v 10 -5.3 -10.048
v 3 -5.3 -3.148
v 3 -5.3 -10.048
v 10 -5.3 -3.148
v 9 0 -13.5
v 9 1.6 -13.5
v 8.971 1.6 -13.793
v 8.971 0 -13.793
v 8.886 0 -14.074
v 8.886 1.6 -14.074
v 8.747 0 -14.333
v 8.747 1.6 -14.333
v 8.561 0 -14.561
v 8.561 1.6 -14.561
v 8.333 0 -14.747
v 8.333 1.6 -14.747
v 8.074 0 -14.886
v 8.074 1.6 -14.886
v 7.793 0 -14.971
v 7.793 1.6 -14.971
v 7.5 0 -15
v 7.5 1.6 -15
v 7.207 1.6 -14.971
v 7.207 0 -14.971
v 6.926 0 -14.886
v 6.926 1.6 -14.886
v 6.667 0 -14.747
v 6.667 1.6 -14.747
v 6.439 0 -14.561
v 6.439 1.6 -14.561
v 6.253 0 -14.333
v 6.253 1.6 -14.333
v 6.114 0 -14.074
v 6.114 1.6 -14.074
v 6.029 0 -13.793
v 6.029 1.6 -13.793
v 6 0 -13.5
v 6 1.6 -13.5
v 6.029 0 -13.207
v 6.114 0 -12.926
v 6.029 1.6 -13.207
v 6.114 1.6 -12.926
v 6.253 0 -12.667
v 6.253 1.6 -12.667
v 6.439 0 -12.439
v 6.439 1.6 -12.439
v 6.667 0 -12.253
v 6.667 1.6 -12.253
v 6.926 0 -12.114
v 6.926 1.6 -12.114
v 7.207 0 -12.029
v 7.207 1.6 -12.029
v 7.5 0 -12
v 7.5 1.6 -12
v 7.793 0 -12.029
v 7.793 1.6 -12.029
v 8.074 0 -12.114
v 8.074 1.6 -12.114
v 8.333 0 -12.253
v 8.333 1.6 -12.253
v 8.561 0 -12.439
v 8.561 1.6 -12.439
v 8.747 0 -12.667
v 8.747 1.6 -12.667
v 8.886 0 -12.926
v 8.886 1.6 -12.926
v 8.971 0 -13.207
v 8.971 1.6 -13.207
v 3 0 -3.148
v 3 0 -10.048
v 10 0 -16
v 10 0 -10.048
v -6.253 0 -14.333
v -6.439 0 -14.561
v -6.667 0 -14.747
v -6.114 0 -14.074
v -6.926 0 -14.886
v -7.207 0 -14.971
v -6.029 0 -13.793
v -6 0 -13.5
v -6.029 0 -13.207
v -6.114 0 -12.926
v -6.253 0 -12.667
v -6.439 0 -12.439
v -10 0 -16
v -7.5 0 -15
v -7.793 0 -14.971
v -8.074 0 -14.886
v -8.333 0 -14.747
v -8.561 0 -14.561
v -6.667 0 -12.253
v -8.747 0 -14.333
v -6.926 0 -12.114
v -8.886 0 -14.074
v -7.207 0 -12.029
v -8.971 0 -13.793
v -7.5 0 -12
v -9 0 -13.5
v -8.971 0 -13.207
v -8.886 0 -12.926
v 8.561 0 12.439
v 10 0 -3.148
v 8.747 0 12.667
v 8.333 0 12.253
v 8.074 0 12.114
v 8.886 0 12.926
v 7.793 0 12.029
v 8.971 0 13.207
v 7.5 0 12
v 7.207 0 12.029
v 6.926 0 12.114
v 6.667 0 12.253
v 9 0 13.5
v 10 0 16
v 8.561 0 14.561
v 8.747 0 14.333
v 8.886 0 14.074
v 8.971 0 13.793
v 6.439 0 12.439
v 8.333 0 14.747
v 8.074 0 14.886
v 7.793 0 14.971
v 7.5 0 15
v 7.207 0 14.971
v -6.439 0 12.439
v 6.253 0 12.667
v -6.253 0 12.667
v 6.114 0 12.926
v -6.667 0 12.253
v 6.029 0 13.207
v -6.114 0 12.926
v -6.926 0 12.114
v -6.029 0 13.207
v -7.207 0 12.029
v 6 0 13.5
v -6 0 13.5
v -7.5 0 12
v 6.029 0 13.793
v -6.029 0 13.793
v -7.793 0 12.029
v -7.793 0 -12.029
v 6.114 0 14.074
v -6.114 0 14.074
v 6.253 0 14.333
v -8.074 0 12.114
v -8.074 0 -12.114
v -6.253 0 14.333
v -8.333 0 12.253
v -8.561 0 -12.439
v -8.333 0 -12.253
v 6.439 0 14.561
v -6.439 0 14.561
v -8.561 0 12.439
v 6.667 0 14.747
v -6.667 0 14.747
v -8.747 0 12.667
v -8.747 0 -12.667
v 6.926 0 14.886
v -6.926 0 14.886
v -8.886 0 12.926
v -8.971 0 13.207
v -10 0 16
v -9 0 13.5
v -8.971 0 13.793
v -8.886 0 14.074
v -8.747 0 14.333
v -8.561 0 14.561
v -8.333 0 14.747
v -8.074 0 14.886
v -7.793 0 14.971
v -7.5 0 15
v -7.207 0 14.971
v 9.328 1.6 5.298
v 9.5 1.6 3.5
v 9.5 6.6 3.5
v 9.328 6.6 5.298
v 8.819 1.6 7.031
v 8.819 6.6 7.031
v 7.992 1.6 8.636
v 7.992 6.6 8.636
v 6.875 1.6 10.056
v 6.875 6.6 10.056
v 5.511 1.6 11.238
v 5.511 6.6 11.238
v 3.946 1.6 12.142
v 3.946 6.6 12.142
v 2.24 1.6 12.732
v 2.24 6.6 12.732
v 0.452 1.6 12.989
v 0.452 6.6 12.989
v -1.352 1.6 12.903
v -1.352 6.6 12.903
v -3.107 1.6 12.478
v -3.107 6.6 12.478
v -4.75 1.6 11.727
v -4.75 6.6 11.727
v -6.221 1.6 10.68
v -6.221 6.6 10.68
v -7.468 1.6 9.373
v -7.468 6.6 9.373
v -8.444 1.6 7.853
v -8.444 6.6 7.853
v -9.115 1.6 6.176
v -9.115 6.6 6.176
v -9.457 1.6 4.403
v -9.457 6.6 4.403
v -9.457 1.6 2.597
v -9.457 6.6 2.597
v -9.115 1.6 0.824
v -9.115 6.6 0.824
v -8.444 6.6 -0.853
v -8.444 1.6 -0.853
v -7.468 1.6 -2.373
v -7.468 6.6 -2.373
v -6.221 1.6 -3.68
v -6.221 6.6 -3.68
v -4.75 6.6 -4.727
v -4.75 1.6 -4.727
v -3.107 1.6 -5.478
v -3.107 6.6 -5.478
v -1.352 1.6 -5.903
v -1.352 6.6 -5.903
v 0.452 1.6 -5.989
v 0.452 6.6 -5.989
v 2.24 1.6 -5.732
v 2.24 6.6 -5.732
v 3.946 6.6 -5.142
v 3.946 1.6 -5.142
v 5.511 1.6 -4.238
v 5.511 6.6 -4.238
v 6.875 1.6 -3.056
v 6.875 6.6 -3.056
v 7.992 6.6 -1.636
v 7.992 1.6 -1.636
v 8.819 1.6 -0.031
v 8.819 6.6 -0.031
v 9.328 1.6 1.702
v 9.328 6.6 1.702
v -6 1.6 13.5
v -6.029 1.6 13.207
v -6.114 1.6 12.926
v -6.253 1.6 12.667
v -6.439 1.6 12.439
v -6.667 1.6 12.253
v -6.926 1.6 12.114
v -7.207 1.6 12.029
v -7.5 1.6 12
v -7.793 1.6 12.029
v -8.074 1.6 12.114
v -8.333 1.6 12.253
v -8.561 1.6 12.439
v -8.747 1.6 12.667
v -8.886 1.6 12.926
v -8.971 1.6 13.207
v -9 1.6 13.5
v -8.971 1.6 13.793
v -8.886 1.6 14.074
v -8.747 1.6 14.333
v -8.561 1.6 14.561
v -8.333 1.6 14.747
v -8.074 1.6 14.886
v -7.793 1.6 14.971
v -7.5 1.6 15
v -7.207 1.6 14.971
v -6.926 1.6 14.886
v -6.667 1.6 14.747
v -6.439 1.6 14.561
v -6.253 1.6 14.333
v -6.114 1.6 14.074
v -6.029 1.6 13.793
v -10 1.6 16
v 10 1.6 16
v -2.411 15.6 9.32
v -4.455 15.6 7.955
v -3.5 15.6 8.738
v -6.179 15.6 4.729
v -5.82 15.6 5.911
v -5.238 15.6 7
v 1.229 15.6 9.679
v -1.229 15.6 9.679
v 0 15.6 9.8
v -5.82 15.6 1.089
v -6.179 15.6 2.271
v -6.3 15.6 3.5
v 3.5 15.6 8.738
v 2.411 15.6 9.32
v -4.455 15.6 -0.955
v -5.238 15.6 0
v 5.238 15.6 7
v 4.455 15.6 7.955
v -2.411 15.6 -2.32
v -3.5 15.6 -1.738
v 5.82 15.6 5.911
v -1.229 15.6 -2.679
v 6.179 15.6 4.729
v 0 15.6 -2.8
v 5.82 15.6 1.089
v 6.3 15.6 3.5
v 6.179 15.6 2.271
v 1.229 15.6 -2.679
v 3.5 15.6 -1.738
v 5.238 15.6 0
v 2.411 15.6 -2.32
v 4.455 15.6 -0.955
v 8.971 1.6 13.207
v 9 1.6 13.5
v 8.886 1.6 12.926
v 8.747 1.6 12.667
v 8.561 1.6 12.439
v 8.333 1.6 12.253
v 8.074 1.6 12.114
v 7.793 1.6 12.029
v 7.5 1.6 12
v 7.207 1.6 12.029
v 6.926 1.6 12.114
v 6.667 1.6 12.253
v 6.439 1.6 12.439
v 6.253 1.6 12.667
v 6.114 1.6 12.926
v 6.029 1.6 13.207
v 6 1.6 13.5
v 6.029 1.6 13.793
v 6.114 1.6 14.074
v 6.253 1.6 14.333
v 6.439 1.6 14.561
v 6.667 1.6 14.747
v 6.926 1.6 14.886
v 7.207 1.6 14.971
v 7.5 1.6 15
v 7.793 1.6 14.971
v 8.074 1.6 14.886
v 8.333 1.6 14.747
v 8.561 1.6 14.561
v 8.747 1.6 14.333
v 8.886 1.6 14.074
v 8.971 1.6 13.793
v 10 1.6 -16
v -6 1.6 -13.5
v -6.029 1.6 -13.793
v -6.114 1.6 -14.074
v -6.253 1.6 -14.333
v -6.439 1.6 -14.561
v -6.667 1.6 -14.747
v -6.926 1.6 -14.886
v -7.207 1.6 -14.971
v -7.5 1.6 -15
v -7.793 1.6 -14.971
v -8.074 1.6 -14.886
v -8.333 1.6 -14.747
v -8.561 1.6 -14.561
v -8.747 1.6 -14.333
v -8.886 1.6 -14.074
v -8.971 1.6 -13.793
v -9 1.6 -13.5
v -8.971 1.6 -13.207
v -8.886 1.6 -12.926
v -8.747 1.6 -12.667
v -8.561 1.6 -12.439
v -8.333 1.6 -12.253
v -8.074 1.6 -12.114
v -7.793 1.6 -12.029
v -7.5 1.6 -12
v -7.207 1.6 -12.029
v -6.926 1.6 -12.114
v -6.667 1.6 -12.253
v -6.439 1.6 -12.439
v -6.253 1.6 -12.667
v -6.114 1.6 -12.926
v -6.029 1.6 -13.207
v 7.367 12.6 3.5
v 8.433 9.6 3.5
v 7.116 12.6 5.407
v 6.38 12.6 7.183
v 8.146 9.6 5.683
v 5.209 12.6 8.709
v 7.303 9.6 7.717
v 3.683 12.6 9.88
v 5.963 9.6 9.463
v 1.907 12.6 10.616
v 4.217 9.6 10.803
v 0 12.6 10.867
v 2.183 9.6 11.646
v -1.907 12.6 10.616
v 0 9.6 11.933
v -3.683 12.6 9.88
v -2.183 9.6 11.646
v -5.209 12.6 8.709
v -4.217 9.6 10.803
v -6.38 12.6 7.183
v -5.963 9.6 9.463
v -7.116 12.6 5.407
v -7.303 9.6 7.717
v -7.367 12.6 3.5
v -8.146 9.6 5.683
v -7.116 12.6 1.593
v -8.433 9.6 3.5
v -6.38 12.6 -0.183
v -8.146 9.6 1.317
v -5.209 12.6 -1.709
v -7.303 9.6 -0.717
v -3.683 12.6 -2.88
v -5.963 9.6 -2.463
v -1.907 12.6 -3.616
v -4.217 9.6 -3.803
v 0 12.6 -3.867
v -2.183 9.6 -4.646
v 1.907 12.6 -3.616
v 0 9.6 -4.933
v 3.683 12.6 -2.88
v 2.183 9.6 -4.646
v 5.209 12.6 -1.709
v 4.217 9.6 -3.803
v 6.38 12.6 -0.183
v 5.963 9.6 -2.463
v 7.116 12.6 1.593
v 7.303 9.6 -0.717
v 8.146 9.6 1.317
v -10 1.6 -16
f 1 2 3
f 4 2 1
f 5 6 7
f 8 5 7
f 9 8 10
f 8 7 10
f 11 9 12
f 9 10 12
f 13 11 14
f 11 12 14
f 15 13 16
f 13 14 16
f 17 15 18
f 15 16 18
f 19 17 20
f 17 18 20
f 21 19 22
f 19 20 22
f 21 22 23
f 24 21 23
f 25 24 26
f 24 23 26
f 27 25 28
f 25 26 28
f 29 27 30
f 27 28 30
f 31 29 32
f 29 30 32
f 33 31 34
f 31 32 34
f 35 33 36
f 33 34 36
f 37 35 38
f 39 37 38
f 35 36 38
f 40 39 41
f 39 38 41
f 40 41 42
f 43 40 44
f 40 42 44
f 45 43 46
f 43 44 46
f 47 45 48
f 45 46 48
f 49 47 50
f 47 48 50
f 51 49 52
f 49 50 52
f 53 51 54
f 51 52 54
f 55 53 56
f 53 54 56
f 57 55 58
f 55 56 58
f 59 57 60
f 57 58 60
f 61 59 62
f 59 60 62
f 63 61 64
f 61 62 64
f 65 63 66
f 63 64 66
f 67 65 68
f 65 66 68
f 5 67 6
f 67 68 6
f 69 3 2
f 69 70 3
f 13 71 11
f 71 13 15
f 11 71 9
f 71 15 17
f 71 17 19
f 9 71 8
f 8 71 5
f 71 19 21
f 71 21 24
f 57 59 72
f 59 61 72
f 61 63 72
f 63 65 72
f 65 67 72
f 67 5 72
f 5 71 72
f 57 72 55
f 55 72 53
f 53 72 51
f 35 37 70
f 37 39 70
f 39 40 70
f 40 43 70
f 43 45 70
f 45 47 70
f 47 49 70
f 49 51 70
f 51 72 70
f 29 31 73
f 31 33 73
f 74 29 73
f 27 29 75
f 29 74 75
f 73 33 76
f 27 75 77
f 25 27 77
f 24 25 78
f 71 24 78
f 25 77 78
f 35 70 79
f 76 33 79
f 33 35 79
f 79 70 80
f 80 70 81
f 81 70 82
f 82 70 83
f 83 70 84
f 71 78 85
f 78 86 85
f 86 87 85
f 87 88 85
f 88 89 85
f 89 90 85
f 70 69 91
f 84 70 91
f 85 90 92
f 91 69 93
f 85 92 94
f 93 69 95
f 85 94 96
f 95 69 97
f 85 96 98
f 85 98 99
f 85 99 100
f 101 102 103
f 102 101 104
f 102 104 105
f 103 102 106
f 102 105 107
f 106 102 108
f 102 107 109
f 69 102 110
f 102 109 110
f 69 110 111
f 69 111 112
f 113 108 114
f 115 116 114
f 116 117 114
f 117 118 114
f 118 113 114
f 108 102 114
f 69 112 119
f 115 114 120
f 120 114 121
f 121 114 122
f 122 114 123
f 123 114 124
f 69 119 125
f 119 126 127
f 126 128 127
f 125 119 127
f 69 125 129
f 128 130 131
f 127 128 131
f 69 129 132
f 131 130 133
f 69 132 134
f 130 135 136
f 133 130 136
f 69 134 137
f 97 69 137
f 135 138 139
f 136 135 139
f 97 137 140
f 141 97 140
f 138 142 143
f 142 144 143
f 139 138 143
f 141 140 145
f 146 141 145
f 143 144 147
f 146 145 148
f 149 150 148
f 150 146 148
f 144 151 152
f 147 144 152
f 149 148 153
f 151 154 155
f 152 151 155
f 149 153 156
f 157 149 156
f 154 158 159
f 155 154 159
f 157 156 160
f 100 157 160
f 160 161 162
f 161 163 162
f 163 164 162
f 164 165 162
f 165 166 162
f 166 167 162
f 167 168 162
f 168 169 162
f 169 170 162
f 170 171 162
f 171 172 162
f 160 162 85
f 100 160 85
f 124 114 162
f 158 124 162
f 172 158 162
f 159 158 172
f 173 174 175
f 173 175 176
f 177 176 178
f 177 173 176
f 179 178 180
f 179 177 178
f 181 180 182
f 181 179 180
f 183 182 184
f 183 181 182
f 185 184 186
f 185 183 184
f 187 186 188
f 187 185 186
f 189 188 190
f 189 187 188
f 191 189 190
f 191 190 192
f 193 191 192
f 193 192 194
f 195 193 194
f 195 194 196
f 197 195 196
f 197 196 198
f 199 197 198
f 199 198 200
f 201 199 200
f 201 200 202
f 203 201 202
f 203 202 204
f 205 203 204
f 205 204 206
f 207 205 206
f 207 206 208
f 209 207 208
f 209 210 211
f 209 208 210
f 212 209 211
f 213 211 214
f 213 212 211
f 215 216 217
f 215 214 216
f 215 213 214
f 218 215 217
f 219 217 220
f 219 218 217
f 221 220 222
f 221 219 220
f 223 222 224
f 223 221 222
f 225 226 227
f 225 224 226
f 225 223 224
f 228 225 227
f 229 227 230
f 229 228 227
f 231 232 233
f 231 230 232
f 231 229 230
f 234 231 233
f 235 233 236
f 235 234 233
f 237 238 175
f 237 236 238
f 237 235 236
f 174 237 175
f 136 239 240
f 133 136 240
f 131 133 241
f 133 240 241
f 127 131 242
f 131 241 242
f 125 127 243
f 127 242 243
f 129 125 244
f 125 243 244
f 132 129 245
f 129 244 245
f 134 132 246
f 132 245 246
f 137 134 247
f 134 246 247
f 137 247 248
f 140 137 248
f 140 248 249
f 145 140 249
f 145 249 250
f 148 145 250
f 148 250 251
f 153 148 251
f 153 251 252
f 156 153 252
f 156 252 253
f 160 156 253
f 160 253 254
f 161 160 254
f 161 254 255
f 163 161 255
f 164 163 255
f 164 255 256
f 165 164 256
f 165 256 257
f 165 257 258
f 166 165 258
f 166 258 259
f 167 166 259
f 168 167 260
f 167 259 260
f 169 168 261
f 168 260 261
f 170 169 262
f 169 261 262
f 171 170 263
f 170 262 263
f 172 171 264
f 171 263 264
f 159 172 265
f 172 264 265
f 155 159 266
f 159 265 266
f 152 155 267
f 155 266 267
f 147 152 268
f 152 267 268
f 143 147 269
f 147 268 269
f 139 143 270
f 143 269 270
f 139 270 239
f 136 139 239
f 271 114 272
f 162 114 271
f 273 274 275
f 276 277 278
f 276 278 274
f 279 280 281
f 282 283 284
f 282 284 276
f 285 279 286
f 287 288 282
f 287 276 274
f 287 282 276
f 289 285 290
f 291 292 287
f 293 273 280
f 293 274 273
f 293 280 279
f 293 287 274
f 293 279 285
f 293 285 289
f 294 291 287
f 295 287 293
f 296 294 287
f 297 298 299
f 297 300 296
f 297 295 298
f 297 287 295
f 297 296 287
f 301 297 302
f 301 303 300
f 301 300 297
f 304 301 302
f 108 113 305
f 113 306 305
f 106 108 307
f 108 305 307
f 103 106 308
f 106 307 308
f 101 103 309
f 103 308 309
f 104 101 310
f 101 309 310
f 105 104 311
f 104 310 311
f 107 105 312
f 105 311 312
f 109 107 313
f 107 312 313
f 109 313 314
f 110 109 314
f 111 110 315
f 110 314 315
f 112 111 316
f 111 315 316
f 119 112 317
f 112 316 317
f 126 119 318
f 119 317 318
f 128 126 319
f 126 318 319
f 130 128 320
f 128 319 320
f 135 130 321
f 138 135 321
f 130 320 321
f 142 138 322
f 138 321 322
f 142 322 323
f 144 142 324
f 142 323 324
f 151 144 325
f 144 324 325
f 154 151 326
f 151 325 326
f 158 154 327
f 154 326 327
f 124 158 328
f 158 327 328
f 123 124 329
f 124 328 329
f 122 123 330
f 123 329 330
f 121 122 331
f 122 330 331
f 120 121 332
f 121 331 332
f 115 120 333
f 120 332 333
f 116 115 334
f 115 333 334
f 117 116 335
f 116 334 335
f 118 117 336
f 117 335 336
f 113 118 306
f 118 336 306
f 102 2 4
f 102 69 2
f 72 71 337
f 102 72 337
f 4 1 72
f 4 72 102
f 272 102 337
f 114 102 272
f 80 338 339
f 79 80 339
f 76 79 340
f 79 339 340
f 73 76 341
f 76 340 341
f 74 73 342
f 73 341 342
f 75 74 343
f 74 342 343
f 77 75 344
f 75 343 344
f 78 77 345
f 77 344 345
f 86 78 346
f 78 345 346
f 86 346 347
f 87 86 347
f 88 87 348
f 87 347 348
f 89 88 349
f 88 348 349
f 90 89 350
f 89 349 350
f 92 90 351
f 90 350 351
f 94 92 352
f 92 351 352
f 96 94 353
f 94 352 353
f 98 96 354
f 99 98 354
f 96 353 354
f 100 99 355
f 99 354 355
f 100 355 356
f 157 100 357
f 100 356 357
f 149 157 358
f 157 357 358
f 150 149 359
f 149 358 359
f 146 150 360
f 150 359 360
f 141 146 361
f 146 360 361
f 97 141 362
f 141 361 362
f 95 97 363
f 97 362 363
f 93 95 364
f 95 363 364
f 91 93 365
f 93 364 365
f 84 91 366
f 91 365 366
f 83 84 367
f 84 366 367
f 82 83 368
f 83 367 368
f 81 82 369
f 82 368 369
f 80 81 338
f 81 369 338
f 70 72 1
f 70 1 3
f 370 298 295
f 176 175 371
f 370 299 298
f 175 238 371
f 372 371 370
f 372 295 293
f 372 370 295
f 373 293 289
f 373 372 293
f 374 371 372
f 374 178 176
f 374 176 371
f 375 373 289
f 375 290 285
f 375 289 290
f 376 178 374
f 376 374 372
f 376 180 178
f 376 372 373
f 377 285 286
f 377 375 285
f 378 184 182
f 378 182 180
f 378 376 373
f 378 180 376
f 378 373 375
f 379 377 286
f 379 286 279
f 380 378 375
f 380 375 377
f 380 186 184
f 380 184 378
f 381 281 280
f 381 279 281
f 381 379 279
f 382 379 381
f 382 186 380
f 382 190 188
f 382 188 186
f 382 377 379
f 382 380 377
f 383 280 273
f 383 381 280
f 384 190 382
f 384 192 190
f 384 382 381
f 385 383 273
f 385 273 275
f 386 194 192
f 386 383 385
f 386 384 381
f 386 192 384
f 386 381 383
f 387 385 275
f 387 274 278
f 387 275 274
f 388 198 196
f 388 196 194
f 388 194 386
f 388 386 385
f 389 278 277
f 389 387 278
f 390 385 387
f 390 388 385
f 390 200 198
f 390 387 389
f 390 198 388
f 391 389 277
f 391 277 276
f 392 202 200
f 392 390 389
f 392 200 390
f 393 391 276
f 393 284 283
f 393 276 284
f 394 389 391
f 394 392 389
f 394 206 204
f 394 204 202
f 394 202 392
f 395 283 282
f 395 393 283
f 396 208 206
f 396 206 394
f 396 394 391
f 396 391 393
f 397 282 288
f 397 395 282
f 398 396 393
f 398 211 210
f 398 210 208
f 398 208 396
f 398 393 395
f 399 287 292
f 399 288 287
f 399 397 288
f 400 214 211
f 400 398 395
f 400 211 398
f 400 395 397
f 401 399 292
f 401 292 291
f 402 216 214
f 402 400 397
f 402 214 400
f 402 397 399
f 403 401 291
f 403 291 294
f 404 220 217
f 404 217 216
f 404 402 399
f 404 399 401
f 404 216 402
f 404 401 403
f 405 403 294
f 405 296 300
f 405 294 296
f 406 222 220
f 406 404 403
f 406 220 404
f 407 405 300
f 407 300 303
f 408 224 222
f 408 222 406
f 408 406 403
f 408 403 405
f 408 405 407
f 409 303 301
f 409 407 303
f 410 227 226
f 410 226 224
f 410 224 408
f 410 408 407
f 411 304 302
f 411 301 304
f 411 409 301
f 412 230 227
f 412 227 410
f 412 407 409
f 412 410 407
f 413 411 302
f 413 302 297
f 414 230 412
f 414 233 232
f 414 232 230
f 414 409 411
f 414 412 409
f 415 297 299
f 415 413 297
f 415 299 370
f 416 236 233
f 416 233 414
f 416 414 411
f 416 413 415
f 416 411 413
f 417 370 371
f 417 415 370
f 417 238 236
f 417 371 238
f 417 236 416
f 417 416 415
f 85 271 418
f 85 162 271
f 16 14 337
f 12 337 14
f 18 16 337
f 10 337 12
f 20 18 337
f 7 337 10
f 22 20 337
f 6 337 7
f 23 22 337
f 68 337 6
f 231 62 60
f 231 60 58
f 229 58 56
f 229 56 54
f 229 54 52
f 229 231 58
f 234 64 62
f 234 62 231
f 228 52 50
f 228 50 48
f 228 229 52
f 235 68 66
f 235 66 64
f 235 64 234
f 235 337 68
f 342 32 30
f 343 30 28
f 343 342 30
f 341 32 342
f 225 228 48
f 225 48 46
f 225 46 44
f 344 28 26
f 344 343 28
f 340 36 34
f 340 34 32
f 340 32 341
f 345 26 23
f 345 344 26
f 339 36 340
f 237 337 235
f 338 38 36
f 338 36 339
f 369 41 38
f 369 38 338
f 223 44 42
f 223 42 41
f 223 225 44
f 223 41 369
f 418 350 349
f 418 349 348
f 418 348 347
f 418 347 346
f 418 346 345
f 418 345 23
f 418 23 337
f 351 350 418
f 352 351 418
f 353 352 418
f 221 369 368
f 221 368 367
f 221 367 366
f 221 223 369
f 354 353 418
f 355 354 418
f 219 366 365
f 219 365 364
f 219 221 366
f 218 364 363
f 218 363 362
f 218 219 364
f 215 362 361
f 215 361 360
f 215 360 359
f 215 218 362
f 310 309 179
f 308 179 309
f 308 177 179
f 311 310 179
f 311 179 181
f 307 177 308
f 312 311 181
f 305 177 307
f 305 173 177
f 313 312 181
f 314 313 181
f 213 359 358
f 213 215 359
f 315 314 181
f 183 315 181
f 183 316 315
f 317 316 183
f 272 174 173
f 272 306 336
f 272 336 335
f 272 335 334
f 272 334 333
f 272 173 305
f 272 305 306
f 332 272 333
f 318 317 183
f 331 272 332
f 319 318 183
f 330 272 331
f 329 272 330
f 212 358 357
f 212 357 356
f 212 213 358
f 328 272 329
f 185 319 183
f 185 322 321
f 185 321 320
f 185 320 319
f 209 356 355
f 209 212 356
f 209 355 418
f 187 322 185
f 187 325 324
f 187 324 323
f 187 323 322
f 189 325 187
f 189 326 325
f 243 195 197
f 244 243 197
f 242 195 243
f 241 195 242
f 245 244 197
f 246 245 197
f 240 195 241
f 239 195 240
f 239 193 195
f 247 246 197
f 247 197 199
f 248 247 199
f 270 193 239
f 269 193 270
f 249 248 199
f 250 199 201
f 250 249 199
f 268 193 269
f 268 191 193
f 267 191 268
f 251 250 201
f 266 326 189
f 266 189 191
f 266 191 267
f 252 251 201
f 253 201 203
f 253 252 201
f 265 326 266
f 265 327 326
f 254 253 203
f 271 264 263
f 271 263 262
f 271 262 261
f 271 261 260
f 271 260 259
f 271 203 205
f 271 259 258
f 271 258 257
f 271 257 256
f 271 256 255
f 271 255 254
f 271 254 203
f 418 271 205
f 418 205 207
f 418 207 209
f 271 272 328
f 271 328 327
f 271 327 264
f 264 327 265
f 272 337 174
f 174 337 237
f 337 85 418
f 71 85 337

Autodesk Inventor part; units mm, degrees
ref_plane "YZ Plane" through (0, 0, 0) normal (1, 0, 0) x (0, 1, 0)
ref_plane "XZ Plane" through (0, 0, 0) normal (0, 1, 0) x (-1, 0, 0)
sketch "Sketch1" plane through (0, 0, 0) normal (0, 1, 0) x (-1, 0, 0)
  line L0 (-10, 16) -> (10, 16)
  line L1 (10, 16) -> (10, -16)
  line L2 (10, -16) -> (-10, -16)
  line L3 (-10, -16) -> (-10, 16)
  line L4 (-10, 16) -> (10, -16) construction
  line L5 (10, 16) -> (-10, -16) construction
  point P0 (0, 0)
  dimension "d0" = 20
  dimension "d1" = 32
extrude "Extrusion1" add sketch "Sketch1" along normal blind 1.6
sketch "Sketch3" plane through (0, 1.6, 0) normal (0, 1, 0) x (1, 0, 0)
  line L0 (-10, 16) -> (-10, -16) projected
  line L1 (-10, -16) -> (-7.5, -16)
  line L2 (-10, -16) -> (10, -16) projected
  line L3 (-7.5, -16) -> (-7.5, -13.5)
  circle A0 centre (-7.5, -13.5) radius 1.5
  point P0 (0, 0)
  dimension "d4" = 2.5
  dimension "d5" = 2.5
  dimension "d6" = 3
extrude "Extrusion2" cut sketch "Sketch3" against normal blind 1.6
pattern_linear "Rectangular Pattern1" count 2 spacing 27 along (0, 0, -1) count 2 spacing 15 along (1, 0, 0) of "Extrusion2"
sketch "Sketch4" plane through (0, 1.6, 0) normal (0, 1, 0) x (1, 0, 0)
  line L0 (-10, -16) -> (10, -16) projected
  line L1 (10, 16) -> (-10, 16) projected
  circle A0 centre (0, -3.5) radius 9.5
  point P0 (0, 0)
extrude "Extrusion3" add sketch "Sketch4" along normal blind 5
ref_plane "Work Plane1" through (0, 15.6, 3.5) normal (0, 1, 0) x (1, 0, 0)
sketch "Sketch5" plane through (0, 15.6, 3.5) normal (0, 1, 0) x (1, 0, 0)
  circle A0 centre (0, 0) radius 6.3
  point P0 (0, 3.5)
  dimension "d22" = 12.6
sketch "Sketch6" plane through (0, 6.6, 3.5) normal (0, 1, 0) x (1, 0, 0)
  circle A0 centre (0, 0) radius 9.5
  point P0 (0, 3.5)
loft "Loft1" add profiles "Sketch5" section 1 edges at (-9.5, 6.6, 3.5)
sketch "Sketch7" plane through (0, 0, 0) normal (0, -1, 0) x (1, 0, 0)
  line L0 (9.9296, -16.0477) -> (10, -10.0481)
  line L1 (10, 16) -> (10, -16) projected
  line L2 (10, -10.0481) -> (3, -10.0481)
  line L3 (3, -10.0481) -> (3, -3.1481)
  line L4 (3, -3.1481) -> (10, -3.1481)
  line L5 (10, -3.1481) -> (10, -10.0481)
  point P0 (0, 0)
  dimension "d27" = 6
  dimension "d28" = 7
  dimension "d29" = 6.9
extrude "Extrusion4" add sketch "Sketch7" along normal blind 5.3
properties part number "SensorGas"
